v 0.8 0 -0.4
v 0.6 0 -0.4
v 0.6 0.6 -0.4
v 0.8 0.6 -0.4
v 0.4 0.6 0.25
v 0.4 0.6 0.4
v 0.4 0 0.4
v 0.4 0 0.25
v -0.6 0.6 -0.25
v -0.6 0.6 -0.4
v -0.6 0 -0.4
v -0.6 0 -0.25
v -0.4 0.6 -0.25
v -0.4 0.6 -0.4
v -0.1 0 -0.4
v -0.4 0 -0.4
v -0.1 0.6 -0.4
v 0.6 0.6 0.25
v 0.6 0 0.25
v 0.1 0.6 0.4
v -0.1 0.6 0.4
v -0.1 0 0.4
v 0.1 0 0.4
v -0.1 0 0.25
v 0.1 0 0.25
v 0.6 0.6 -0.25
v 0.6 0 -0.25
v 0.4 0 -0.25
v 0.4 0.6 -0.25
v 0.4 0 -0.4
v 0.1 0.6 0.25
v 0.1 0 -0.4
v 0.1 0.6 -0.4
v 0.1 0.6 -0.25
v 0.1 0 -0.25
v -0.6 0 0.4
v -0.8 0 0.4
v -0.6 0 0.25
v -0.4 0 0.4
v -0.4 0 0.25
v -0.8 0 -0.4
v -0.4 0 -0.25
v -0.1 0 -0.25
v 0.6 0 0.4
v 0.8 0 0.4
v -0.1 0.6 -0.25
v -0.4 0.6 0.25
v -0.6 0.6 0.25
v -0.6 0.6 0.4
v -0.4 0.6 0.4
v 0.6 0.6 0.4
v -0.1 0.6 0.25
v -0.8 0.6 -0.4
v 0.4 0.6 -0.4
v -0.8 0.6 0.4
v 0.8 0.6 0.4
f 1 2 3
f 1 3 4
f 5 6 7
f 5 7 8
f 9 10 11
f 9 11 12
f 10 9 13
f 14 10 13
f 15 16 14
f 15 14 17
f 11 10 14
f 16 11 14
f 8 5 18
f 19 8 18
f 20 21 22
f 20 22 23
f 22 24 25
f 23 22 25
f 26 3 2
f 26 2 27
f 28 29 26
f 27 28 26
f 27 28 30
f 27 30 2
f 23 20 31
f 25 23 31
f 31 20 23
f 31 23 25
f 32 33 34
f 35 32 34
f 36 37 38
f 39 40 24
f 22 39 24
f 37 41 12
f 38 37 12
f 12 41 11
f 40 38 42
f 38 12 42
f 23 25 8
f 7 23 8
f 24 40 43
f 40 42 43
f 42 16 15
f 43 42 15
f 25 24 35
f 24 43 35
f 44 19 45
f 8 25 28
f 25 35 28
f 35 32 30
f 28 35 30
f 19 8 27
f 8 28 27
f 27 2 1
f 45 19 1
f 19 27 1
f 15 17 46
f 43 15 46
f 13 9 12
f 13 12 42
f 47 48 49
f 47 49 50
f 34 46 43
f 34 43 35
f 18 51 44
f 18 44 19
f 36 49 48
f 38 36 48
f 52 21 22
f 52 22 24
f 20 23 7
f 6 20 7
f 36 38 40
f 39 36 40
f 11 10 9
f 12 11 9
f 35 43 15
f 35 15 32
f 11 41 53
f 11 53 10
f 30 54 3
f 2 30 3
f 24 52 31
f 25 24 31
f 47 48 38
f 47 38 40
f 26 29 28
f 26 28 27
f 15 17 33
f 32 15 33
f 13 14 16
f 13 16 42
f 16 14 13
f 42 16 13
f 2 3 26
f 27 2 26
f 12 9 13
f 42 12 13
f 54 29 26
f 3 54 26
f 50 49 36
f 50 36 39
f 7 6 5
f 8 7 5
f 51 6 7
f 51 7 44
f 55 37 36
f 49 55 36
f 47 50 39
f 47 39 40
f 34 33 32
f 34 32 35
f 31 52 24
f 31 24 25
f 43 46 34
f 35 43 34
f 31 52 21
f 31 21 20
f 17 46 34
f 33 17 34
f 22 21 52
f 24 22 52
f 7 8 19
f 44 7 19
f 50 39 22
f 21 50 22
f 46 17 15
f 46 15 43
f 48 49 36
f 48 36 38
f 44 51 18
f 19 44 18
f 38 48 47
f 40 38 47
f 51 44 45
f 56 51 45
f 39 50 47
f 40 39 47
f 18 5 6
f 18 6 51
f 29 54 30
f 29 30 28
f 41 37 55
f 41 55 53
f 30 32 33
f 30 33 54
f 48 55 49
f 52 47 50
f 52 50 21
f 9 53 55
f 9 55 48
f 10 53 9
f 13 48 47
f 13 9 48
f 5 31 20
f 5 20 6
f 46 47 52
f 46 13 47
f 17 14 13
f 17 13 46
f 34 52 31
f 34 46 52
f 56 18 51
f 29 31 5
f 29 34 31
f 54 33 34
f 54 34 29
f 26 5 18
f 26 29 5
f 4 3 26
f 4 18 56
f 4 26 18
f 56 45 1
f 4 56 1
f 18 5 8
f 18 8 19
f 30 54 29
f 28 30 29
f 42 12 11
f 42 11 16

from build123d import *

# Parameters (mm, degrees)
SKETCH1_W             = 1.6
SKETCH1_H             = 0.8
BOSS_EXTRUDE1_DEPTH   = 0.6
SKETCH2_W             = 0.2
SKETCH2_H             = 0.15
CUT_EXTRUDE1_DEPTH    = 0.6
SKETCH2_2_W           = 0.2
SKETCH2_2_H           = 0.15
BOSS_EXTRUDE2_DEPTH   = 0.6
BOSS_EXTRUDE2_2_DEPTH = 0.6
BOSS_EXTRUDE2_3_DEPTH = 0.6


with BuildPart() as part:
    # Sketch1 → Boss-Extrude1 (new body)
    with BuildSketch(Plane(origin=(0, 0, 0), x_dir=(1, 0, 0), z_dir=(0, 1, 0))):
        Rectangle(SKETCH1_W, SKETCH1_H)
    extrude(amount=BOSS_EXTRUDE1_DEPTH)

    # Sketch2 → Cut-Extrude1 (cut)
    with BuildSketch(Plane(origin=(0, 0.6, 0), x_dir=(1, 0, 0), z_dir=(0, 1, 0))):
        with Locations((-0.5, -0.325)):
            Rectangle(SKETCH2_W, SKETCH2_H)
        with Locations((0.5, -0.325)):
            Rectangle(SKETCH2_W, SKETCH2_H)
        with Locations((0, -0.325)):
            Rectangle(SKETCH2_W, SKETCH2_H)
    cut_extrude1 = extrude(amount=-CUT_EXTRUDE1_DEPTH, mode=Mode.SUBTRACT)

    # Mirror1: Cut-Extrude1 across plane
    add(cut_extrude1.mirror(Plane.XY), mode=Mode.SUBTRACT)


with BuildPart() as body_2:
    # Sketch2<2> → Boss-Extrude2 (new body)
    with BuildSketch(Plane(origin=(0, 0.6, 0), x_dir=(1, 0, 0), z_dir=(0, 1, 0))):
        with Locations((-0.5, -0.325)):
            Rectangle(SKETCH2_2_W, SKETCH2_2_H)
    extrude(amount=-BOSS_EXTRUDE2_DEPTH)


with BuildPart() as body_3:
    # Sketch2<2> → Boss-Extrude2 2 (new body)
    with BuildSketch(Plane(origin=(0, 0.6, 0), x_dir=(1, 0, 0), z_dir=(0, 1, 0))):
        with Locations((0.5, -0.325)):
            Rectangle(SKETCH2_2_W, SKETCH2_2_H)
    extrude(amount=-BOSS_EXTRUDE2_2_DEPTH)


with BuildPart() as body_4:
    # Sketch2<2> → Boss-Extrude2 3 (new body)
    with BuildSketch(Plane(origin=(0, 0.6, 0), x_dir=(1, 0, 0), z_dir=(0, 1, 0))):
        with Locations((0, -0.325)):
            Rectangle(SKETCH2_2_W, SKETCH2_2_H)
    extrude(amount=-BOSS_EXTRUDE2_3_DEPTH)


with BuildPart() as body_5:
    # Mirror3: mirrored copy
    add(body_2.part.mirror(Plane.XY))


with BuildPart() as body_6:
    # Mirror3 2: mirrored copy
    add(body_4.part.mirror(Plane.XY))


with BuildPart() as body_7:
    # Mirror3 3: mirrored copy
    add(body_3.part.mirror(Plane.XY))


solid = Compound([part.part, body_2.part, body_3.part, body_4.part, body_5.part, body_6.part, body_7.part])
